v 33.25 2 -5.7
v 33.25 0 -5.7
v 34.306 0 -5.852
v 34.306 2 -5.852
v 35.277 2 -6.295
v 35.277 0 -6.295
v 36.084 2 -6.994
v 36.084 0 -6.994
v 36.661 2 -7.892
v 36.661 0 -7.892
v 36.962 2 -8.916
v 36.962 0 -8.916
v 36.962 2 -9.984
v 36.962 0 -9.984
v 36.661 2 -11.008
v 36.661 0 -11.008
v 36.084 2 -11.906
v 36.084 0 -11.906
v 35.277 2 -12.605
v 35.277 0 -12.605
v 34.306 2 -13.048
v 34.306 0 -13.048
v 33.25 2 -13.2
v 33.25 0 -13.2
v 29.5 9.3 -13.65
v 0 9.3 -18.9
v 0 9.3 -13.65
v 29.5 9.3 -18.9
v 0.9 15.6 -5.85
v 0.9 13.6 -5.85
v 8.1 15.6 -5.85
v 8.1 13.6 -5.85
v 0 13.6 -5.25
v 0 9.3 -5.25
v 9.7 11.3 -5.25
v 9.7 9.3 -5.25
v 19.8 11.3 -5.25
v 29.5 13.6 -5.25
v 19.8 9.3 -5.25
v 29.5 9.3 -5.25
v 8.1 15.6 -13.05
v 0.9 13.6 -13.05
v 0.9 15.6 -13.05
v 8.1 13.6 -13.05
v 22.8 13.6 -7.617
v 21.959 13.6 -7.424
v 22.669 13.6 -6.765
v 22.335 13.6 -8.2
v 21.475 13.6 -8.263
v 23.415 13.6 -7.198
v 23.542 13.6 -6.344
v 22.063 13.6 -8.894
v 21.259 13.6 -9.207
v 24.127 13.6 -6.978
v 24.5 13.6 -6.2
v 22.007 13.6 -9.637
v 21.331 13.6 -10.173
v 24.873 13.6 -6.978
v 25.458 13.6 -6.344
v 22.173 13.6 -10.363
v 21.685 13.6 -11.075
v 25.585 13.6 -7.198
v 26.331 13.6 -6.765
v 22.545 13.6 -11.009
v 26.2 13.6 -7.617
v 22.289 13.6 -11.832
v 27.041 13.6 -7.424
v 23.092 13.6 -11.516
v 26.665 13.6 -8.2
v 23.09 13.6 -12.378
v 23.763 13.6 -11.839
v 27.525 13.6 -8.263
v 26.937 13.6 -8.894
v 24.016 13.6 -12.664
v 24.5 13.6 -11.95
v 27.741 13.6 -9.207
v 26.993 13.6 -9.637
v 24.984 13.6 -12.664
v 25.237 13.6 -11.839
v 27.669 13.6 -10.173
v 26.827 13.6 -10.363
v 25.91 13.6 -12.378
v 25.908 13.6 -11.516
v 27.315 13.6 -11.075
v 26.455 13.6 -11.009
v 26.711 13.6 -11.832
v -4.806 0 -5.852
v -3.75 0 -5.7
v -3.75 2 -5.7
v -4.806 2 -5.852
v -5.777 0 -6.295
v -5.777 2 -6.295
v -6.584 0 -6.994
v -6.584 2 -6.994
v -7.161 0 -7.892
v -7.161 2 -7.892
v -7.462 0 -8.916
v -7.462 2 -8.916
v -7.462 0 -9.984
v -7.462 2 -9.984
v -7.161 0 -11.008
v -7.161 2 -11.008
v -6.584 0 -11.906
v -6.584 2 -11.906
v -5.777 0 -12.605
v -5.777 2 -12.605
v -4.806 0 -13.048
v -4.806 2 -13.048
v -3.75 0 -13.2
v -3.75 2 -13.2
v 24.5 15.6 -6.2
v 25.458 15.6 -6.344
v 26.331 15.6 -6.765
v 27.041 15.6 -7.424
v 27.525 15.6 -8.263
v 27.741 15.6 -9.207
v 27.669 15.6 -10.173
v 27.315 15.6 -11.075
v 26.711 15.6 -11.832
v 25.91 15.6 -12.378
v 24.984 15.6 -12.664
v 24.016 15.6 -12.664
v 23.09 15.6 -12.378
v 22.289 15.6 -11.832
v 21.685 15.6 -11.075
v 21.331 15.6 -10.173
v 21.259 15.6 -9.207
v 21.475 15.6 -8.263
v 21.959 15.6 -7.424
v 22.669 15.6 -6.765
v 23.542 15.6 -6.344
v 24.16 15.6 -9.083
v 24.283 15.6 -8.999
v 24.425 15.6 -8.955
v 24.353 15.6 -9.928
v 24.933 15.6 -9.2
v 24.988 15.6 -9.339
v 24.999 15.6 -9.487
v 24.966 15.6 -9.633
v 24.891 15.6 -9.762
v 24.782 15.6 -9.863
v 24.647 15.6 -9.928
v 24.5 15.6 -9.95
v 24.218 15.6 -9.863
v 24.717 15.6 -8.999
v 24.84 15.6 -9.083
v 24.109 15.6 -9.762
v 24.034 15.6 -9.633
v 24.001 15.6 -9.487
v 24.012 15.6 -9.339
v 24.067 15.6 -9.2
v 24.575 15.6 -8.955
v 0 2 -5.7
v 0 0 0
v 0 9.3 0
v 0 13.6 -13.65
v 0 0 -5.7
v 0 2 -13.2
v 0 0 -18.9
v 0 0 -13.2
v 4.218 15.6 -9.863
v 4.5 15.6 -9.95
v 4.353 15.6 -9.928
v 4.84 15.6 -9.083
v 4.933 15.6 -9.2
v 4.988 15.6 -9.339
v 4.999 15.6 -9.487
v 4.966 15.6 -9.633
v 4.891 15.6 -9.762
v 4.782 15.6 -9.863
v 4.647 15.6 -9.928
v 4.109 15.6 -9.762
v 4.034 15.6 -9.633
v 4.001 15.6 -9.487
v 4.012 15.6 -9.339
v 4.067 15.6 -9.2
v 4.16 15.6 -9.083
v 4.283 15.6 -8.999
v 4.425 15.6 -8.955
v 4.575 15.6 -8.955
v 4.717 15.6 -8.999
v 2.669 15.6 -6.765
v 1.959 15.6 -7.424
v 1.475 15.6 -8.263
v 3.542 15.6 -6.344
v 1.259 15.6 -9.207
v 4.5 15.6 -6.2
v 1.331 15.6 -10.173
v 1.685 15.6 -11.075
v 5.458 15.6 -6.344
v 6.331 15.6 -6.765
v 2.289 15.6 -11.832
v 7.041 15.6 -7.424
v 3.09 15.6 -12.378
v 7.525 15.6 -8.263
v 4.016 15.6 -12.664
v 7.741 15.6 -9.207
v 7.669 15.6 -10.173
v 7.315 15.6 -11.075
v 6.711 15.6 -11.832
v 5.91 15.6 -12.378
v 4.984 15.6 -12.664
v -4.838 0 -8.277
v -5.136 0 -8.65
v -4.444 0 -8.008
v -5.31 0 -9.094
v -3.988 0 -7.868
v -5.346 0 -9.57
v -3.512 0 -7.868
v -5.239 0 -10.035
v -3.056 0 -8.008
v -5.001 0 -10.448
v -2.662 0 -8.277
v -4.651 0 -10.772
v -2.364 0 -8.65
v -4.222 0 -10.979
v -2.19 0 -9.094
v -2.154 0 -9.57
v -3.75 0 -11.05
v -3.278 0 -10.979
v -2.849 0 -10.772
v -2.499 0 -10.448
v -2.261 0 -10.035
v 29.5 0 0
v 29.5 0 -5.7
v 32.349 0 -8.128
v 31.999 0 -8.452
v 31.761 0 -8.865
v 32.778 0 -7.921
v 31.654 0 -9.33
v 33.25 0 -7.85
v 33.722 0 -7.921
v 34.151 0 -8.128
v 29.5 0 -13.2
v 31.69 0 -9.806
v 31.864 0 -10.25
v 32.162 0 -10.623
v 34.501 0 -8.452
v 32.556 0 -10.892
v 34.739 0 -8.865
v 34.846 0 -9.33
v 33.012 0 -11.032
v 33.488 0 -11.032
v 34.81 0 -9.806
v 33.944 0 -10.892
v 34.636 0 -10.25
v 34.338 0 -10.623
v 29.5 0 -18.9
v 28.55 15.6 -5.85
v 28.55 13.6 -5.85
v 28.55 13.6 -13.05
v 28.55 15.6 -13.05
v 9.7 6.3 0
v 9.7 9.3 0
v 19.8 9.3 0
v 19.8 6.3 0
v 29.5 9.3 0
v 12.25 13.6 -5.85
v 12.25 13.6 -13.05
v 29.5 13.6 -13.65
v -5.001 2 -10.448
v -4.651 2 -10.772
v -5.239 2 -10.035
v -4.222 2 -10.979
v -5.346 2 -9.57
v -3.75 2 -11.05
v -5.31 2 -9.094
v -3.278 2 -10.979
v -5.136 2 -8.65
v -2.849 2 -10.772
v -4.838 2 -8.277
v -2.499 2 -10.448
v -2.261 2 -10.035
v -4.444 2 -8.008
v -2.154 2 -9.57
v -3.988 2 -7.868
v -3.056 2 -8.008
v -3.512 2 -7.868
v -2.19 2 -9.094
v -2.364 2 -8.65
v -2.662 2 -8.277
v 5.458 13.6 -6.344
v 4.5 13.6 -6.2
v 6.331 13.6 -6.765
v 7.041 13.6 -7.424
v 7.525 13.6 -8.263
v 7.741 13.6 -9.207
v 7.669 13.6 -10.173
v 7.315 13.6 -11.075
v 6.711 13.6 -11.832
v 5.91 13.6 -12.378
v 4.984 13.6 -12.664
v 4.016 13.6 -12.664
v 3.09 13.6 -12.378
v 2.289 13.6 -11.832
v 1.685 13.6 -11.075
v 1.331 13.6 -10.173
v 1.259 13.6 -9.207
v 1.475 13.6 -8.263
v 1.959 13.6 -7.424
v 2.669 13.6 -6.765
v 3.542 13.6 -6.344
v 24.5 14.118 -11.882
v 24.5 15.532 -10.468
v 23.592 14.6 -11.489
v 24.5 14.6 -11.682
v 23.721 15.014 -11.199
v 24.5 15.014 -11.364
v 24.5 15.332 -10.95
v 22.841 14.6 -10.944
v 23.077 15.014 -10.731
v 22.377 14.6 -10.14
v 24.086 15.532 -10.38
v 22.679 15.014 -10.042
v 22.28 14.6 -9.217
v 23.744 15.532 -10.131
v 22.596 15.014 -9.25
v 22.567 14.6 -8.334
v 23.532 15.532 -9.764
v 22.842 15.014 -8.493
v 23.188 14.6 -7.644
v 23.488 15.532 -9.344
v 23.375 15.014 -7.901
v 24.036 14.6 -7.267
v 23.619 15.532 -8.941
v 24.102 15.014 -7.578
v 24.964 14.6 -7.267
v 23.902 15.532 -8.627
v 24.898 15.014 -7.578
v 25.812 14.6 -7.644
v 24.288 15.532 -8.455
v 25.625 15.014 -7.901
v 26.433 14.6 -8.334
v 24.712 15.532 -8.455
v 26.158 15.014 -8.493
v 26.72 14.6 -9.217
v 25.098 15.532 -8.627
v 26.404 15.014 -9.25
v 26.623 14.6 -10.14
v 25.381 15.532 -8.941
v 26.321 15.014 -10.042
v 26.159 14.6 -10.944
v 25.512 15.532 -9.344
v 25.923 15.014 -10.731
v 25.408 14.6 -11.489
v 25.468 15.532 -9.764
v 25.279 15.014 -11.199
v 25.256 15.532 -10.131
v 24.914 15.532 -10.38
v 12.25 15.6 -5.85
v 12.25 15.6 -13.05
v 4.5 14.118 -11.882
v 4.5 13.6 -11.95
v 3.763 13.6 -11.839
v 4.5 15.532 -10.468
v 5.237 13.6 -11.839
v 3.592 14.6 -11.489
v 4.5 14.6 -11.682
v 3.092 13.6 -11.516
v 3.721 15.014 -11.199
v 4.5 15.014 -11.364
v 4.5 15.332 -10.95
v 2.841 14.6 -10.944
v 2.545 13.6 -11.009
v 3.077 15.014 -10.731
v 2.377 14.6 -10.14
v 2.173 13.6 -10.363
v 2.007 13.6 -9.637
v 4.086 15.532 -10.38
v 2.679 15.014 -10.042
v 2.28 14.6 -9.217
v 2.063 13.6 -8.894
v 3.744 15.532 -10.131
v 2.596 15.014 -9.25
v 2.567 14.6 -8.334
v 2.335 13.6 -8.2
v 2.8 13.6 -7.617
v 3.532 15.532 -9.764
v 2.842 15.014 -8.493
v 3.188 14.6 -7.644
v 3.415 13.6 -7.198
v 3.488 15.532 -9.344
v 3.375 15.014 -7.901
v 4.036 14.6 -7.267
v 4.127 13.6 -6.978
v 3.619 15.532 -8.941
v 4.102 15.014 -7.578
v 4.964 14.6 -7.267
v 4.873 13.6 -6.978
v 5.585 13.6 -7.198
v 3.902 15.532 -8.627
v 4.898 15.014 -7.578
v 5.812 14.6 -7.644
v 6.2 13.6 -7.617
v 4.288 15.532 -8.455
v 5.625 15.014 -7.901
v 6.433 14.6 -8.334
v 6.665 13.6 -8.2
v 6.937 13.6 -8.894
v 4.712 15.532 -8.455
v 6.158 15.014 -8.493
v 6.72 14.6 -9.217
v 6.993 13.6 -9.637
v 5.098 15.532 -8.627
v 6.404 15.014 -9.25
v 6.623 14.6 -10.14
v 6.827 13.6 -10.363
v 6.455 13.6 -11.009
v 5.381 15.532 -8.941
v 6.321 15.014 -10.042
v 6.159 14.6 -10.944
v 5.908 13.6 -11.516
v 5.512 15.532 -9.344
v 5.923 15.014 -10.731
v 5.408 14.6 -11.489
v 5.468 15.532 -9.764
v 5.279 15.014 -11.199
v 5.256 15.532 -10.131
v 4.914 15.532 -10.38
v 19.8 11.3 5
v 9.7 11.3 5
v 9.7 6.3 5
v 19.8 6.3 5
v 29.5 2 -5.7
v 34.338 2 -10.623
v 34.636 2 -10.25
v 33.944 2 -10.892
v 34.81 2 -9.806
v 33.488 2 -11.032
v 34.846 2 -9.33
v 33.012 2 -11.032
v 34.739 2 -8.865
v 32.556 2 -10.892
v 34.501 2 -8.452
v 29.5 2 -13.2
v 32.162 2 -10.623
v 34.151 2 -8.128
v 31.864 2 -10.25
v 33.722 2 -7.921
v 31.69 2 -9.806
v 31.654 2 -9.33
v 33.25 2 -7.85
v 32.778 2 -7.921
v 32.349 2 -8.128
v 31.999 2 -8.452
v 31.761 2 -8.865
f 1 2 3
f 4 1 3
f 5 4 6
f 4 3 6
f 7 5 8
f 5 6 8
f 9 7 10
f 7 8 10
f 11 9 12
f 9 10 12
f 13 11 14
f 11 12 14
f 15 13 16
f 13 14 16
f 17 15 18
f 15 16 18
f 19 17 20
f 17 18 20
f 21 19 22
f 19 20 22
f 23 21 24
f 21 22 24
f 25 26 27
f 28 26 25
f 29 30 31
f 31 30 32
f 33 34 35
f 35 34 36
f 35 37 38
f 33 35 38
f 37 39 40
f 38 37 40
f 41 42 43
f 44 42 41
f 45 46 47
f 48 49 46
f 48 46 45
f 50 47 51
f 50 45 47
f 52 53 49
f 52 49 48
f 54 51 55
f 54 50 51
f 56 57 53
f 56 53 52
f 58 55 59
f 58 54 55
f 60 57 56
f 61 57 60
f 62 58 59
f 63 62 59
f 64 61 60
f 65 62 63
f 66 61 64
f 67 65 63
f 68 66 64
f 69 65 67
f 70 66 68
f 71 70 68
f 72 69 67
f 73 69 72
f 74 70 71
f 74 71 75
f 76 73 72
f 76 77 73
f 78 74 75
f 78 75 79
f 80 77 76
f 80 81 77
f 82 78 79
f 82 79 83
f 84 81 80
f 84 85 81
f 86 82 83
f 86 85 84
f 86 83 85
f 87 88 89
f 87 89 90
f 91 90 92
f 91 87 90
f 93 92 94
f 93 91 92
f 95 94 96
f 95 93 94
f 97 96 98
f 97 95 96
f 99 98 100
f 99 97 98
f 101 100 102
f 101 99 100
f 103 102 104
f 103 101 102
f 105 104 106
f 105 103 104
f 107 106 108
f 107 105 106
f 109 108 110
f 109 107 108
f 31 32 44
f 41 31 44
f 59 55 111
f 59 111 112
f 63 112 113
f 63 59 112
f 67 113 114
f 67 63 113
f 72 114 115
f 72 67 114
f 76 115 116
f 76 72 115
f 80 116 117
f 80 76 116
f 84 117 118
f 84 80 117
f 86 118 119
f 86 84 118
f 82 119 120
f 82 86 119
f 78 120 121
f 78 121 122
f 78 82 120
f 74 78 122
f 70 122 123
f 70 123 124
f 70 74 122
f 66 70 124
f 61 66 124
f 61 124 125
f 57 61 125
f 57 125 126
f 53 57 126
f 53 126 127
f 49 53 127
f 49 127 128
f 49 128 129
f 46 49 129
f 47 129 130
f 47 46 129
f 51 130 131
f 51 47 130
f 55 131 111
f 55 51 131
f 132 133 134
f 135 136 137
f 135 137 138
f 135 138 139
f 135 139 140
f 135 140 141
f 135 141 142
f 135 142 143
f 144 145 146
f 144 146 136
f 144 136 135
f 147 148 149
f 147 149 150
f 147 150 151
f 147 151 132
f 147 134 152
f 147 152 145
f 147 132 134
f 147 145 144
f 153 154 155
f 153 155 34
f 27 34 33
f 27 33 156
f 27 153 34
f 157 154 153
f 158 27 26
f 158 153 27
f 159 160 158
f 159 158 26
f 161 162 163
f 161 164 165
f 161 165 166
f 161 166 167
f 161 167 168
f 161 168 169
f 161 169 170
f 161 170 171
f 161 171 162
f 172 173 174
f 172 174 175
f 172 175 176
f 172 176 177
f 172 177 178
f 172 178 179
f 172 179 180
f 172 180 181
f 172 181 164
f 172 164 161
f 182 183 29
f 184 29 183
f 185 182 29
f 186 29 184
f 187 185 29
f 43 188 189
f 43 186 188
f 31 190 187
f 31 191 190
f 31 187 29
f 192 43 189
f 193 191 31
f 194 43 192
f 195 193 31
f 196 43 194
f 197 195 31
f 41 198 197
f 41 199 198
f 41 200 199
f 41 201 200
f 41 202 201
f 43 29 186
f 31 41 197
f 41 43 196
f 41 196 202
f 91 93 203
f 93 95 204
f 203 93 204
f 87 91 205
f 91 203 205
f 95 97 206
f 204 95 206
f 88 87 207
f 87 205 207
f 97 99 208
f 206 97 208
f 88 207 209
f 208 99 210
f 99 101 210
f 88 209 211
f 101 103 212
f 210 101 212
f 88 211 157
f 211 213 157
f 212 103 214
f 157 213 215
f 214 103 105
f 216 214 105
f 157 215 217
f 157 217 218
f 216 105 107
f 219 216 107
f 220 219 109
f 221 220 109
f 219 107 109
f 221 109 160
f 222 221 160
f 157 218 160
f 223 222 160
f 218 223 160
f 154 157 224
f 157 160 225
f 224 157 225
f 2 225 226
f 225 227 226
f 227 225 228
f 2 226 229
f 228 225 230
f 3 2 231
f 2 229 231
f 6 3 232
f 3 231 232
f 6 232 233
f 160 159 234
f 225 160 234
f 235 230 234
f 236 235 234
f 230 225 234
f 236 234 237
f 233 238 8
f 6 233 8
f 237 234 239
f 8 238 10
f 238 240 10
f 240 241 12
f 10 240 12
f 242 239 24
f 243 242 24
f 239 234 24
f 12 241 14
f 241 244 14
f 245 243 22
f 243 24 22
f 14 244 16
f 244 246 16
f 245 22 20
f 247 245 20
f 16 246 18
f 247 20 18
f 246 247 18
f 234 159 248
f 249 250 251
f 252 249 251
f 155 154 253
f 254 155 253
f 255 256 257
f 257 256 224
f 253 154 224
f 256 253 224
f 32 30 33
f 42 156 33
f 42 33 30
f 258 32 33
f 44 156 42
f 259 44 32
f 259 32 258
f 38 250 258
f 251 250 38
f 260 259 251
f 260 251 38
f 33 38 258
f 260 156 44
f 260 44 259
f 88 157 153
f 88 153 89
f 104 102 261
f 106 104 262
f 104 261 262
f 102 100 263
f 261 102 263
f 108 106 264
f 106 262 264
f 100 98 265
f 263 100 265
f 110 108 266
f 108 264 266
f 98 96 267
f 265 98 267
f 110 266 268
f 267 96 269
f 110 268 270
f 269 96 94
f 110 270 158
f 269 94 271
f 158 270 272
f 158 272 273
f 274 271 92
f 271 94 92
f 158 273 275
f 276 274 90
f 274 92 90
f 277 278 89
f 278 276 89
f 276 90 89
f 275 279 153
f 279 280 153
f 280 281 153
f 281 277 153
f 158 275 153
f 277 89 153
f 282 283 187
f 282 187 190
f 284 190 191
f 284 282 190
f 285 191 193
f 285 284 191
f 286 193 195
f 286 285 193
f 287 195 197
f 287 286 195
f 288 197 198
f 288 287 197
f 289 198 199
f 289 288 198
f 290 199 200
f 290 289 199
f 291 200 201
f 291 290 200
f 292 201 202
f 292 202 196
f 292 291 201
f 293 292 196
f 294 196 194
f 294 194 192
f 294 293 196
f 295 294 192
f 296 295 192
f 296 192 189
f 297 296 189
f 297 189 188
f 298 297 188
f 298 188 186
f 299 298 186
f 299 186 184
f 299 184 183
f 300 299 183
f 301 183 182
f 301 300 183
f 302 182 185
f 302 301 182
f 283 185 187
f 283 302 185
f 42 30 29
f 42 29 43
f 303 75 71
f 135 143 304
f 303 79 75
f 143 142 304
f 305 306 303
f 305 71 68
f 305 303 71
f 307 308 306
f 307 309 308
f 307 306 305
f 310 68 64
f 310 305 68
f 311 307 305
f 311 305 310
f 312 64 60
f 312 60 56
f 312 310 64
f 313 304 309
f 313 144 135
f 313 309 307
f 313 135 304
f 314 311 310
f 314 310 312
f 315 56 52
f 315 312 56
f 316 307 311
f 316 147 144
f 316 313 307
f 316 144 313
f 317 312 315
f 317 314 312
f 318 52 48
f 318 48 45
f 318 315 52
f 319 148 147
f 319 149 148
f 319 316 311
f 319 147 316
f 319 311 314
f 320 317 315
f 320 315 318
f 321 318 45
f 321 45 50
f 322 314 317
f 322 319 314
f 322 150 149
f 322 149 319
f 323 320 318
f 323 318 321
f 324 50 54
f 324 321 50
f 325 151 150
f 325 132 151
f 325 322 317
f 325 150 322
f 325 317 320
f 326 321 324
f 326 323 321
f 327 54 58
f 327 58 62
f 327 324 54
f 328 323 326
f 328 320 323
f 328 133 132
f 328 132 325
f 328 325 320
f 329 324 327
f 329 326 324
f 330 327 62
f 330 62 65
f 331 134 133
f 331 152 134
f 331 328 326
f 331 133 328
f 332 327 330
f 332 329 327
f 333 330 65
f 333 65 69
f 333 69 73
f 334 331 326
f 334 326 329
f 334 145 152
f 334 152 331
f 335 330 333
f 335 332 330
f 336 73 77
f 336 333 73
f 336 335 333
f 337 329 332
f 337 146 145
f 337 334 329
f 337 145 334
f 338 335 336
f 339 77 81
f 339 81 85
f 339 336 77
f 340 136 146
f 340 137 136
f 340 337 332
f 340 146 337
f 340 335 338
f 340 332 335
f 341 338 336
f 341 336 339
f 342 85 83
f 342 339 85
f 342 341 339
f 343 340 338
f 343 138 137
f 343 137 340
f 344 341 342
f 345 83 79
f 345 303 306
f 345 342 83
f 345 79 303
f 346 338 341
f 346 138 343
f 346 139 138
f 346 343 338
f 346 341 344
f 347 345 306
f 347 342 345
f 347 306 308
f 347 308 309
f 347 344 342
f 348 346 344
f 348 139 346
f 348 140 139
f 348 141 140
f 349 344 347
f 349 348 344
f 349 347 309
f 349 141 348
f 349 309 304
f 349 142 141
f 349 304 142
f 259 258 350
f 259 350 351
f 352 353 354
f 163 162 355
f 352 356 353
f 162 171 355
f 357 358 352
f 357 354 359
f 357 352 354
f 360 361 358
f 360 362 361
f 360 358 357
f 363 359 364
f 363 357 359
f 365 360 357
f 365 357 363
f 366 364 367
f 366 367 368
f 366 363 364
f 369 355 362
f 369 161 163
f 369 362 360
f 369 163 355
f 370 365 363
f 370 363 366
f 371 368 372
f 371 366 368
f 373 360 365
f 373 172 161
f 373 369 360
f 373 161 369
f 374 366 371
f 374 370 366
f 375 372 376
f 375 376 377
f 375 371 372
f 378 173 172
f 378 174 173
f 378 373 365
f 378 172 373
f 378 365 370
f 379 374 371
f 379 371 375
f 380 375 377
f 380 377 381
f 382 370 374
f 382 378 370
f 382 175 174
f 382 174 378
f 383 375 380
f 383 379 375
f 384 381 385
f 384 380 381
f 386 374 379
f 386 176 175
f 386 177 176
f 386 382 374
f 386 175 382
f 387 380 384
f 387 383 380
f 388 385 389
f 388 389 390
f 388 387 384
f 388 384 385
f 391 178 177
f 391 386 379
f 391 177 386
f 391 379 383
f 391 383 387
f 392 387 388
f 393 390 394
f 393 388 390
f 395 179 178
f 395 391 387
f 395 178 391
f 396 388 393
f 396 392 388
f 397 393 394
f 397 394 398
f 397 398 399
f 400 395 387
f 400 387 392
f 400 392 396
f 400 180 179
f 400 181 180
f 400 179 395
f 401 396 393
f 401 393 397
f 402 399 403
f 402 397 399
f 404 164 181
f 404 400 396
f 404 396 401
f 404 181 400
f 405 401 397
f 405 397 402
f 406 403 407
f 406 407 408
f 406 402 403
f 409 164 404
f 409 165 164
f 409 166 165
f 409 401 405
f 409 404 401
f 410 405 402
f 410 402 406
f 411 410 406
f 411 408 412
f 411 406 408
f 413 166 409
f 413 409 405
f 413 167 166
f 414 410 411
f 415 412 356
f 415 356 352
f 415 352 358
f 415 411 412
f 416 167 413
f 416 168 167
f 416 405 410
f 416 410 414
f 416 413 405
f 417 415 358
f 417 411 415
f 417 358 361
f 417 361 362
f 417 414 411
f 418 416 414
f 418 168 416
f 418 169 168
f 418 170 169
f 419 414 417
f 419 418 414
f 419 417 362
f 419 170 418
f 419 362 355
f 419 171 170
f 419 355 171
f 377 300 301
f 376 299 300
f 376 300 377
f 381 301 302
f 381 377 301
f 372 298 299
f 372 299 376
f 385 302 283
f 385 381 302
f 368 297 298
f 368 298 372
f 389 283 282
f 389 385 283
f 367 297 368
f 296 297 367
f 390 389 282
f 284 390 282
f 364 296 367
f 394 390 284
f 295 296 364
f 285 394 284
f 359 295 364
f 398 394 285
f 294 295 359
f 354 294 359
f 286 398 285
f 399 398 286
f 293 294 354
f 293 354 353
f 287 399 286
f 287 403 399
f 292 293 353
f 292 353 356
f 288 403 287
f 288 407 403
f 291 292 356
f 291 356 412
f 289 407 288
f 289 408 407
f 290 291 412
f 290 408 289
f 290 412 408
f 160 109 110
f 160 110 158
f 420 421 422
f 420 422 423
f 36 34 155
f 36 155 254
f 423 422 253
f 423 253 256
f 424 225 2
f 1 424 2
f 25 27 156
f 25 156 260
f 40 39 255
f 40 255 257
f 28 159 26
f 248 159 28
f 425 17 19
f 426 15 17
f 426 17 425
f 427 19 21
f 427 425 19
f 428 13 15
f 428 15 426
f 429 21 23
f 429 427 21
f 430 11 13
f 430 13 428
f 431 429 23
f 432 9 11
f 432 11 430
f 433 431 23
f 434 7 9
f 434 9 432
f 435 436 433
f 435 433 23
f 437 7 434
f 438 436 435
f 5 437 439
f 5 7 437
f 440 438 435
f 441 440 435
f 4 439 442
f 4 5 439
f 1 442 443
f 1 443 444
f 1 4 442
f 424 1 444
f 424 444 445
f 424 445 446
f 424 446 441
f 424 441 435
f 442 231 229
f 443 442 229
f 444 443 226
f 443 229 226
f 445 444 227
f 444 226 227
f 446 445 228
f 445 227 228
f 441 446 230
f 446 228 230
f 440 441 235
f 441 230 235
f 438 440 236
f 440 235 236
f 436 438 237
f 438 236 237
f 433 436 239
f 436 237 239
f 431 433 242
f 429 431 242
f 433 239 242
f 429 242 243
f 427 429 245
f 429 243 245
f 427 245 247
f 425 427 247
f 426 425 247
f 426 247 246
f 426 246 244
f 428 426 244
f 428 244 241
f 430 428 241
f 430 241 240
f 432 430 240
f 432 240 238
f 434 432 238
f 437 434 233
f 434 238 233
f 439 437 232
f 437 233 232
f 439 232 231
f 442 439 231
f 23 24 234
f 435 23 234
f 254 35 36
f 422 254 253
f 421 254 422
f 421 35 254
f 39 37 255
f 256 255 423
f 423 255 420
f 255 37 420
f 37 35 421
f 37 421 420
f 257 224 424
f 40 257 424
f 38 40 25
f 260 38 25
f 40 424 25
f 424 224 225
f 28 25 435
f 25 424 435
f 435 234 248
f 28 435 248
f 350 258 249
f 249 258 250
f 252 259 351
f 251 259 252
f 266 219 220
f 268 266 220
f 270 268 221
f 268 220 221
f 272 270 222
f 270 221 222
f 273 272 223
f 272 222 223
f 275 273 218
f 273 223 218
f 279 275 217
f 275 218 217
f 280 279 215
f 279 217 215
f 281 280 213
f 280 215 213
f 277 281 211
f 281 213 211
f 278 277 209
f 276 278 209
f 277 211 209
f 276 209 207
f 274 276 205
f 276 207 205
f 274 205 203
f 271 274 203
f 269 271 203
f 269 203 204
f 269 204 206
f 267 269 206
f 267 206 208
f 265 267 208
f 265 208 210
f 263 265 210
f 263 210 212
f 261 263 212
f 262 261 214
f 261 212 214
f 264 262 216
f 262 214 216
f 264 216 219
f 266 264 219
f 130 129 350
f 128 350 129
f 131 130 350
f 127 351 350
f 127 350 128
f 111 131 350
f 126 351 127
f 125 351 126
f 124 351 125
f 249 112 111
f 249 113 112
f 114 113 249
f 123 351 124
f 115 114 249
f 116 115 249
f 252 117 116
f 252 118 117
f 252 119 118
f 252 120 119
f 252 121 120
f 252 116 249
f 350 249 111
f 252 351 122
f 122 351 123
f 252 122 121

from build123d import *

# Parameters (mm, degrees)
ESQUISSE1_W      = 29.5
ESQUISSE1_H      = 18.9
EXTRUSION1_DEPTH = 9.3
ESQUISSE2_W      = 29.5
ESQUISSE2_H      = 8.4
EXTRUSION2_DEPTH = 4.3
ESQUISSE3_W      = 7.2
ESQUISSE3_H      = 7.2
ESQUISSE3_R      = 3.25
ESQUISSE3_W_2    = 16.3
EXTRUSION3_DEPTH = 2
ESQUISSE4_R      = 2.5
EXTRUSION4_DEPTH = 2
CONG_1_R         = 2
ESQUISSE5_R      = 1.6
EXTRUSION5_DEPTH = 2
ESQUISSE6_W      = 10.1
ESQUISSE6_H      = 10.25
EXTRUSION6_DEPTH = 2
ESQUISSE7_W      = 10.1
ESQUISSE7_H      = 5
EXTRUSION7_DEPTH = 3


with BuildPart() as part:
    # Esquisse1 → Extrusion1 (new body)
    with BuildSketch(Plane(origin=(0, 0, 0), x_dir=(1, 0, 0), z_dir=(0, 1, 0))):
        with Locations((14.75, 9.45)):
            Rectangle(ESQUISSE1_W, ESQUISSE1_H)
    extrude(amount=EXTRUSION1_DEPTH)

    # Esquisse2 → Extrusion2 (add)
    with BuildSketch(Plane(origin=(0, 9.3, 0), x_dir=(1, 0, 0), z_dir=(0, 1, 0))):
        with Locations((14.75, 9.45)):
            Rectangle(ESQUISSE2_W, ESQUISSE2_H)
    extrude(amount=EXTRUSION2_DEPTH)

    # Esquisse3 → Extrusion3 (add)
    # profile 1 of 2: a face of its own
    with BuildSketch(Plane(origin=(0, 13.6, 0), x_dir=(1, 0, 0), z_dir=(0, 1, 0))):
        with Locations((4.5, 9.45)):
            Rectangle(ESQUISSE3_W, ESQUISSE3_H)
        with Locations(Location((4.5, 9.45, 0), (0, 0, 270))):
            Circle(ESQUISSE3_R, mode=Mode.SUBTRACT)
    # profile 2 of 2: a face of its own
    with BuildSketch(Plane(origin=(0, 13.6, 0), x_dir=(1, 0, 0), z_dir=(0, 1, 0))):
        with Locations((20.4, 9.45)):
            Rectangle(ESQUISSE3_W_2, ESQUISSE3_H)
        with Locations(Location((24.5, 9.45, 0), (0, 0, 270))):
            Circle(ESQUISSE3_R, mode=Mode.SUBTRACT)
    extrude(amount=EXTRUSION3_DEPTH)

    # Esquisse4 → Extrusion4 (add)
    with BuildSketch(Plane(origin=(0, 13.6, 0), x_dir=(1, 0, 0), z_dir=(0, 1, 0))):
        with Locations(Location((4.5, 9.45, 0), (0, 0, 90))):
            Circle(ESQUISSE4_R)
        with Locations(Location((24.5, 9.45, 0), (0, 0, 90))):
            Circle(ESQUISSE4_R)
    extrude(amount=EXTRUSION4_DEPTH)

    # Congé1
    cong_1_edges = [part.edges().sort_by_distance(p)[0] for p in [
        (4.5, 15.6, -6.95),
        (24.5, 15.6, -6.95),
    ]]
    fillet(cong_1_edges, radius=CONG_1_R - 0.0001)  # a hair under: the kernel refuses the full size

    # Esquisse5 → Extrusion5 (add)
    # profile 1 of 2: a face of its own
    with BuildSketch(Plane.XZ):
        with BuildLine():
            Line((0, -5.7), (-3.75, -5.7))
            ThreePointArc((-3.75, -5.7), (-7.5, -9.45), (-3.75, -13.2))
            Line((-3.75, -13.2), (0, -13.2))
            Line((0, -13.2), (0, -5.7))
        make_face()
        with Locations(Location((-3.75, -9.45, 0), (0, 0, 270))):
            Circle(ESQUISSE5_R, mode=Mode.SUBTRACT)
    # profile 2 of 2: a face of its own
    with BuildSketch(Plane.XZ):
        with BuildLine():
            Line((29.5, -5.7), (33.25, -5.7))
            ThreePointArc((33.25, -5.7), (37, -9.45), (33.25, -13.2))
            Line((33.25, -13.2), (29.5, -13.2))
            Line((29.5, -13.2), (29.5, -5.7))
        make_face()
        with Locations(Location((33.25, -9.45, 0), (0, 0, 90))):
            Circle(ESQUISSE5_R, mode=Mode.SUBTRACT)
    extrude(amount=-EXTRUSION5_DEPTH)

    # Esquisse6 → Extrusion6 (add)
    with BuildSketch(Plane(origin=(0, 9.3, 0), x_dir=(1, 0, 0), z_dir=(0, 1, 0))):
        with Locations((14.75, 0.125)):
            Rectangle(ESQUISSE6_W, ESQUISSE6_H)
    extrude(amount=EXTRUSION6_DEPTH)

    # Esquisse7 → Extrusion7 (add)
    with BuildSketch(Plane.XZ.offset(-9.3)):
        with Locations((14.75, 2.5)):
            Rectangle(ESQUISSE7_W, ESQUISSE7_H)
    extrude(amount=EXTRUSION7_DEPTH)


solid = part.part
